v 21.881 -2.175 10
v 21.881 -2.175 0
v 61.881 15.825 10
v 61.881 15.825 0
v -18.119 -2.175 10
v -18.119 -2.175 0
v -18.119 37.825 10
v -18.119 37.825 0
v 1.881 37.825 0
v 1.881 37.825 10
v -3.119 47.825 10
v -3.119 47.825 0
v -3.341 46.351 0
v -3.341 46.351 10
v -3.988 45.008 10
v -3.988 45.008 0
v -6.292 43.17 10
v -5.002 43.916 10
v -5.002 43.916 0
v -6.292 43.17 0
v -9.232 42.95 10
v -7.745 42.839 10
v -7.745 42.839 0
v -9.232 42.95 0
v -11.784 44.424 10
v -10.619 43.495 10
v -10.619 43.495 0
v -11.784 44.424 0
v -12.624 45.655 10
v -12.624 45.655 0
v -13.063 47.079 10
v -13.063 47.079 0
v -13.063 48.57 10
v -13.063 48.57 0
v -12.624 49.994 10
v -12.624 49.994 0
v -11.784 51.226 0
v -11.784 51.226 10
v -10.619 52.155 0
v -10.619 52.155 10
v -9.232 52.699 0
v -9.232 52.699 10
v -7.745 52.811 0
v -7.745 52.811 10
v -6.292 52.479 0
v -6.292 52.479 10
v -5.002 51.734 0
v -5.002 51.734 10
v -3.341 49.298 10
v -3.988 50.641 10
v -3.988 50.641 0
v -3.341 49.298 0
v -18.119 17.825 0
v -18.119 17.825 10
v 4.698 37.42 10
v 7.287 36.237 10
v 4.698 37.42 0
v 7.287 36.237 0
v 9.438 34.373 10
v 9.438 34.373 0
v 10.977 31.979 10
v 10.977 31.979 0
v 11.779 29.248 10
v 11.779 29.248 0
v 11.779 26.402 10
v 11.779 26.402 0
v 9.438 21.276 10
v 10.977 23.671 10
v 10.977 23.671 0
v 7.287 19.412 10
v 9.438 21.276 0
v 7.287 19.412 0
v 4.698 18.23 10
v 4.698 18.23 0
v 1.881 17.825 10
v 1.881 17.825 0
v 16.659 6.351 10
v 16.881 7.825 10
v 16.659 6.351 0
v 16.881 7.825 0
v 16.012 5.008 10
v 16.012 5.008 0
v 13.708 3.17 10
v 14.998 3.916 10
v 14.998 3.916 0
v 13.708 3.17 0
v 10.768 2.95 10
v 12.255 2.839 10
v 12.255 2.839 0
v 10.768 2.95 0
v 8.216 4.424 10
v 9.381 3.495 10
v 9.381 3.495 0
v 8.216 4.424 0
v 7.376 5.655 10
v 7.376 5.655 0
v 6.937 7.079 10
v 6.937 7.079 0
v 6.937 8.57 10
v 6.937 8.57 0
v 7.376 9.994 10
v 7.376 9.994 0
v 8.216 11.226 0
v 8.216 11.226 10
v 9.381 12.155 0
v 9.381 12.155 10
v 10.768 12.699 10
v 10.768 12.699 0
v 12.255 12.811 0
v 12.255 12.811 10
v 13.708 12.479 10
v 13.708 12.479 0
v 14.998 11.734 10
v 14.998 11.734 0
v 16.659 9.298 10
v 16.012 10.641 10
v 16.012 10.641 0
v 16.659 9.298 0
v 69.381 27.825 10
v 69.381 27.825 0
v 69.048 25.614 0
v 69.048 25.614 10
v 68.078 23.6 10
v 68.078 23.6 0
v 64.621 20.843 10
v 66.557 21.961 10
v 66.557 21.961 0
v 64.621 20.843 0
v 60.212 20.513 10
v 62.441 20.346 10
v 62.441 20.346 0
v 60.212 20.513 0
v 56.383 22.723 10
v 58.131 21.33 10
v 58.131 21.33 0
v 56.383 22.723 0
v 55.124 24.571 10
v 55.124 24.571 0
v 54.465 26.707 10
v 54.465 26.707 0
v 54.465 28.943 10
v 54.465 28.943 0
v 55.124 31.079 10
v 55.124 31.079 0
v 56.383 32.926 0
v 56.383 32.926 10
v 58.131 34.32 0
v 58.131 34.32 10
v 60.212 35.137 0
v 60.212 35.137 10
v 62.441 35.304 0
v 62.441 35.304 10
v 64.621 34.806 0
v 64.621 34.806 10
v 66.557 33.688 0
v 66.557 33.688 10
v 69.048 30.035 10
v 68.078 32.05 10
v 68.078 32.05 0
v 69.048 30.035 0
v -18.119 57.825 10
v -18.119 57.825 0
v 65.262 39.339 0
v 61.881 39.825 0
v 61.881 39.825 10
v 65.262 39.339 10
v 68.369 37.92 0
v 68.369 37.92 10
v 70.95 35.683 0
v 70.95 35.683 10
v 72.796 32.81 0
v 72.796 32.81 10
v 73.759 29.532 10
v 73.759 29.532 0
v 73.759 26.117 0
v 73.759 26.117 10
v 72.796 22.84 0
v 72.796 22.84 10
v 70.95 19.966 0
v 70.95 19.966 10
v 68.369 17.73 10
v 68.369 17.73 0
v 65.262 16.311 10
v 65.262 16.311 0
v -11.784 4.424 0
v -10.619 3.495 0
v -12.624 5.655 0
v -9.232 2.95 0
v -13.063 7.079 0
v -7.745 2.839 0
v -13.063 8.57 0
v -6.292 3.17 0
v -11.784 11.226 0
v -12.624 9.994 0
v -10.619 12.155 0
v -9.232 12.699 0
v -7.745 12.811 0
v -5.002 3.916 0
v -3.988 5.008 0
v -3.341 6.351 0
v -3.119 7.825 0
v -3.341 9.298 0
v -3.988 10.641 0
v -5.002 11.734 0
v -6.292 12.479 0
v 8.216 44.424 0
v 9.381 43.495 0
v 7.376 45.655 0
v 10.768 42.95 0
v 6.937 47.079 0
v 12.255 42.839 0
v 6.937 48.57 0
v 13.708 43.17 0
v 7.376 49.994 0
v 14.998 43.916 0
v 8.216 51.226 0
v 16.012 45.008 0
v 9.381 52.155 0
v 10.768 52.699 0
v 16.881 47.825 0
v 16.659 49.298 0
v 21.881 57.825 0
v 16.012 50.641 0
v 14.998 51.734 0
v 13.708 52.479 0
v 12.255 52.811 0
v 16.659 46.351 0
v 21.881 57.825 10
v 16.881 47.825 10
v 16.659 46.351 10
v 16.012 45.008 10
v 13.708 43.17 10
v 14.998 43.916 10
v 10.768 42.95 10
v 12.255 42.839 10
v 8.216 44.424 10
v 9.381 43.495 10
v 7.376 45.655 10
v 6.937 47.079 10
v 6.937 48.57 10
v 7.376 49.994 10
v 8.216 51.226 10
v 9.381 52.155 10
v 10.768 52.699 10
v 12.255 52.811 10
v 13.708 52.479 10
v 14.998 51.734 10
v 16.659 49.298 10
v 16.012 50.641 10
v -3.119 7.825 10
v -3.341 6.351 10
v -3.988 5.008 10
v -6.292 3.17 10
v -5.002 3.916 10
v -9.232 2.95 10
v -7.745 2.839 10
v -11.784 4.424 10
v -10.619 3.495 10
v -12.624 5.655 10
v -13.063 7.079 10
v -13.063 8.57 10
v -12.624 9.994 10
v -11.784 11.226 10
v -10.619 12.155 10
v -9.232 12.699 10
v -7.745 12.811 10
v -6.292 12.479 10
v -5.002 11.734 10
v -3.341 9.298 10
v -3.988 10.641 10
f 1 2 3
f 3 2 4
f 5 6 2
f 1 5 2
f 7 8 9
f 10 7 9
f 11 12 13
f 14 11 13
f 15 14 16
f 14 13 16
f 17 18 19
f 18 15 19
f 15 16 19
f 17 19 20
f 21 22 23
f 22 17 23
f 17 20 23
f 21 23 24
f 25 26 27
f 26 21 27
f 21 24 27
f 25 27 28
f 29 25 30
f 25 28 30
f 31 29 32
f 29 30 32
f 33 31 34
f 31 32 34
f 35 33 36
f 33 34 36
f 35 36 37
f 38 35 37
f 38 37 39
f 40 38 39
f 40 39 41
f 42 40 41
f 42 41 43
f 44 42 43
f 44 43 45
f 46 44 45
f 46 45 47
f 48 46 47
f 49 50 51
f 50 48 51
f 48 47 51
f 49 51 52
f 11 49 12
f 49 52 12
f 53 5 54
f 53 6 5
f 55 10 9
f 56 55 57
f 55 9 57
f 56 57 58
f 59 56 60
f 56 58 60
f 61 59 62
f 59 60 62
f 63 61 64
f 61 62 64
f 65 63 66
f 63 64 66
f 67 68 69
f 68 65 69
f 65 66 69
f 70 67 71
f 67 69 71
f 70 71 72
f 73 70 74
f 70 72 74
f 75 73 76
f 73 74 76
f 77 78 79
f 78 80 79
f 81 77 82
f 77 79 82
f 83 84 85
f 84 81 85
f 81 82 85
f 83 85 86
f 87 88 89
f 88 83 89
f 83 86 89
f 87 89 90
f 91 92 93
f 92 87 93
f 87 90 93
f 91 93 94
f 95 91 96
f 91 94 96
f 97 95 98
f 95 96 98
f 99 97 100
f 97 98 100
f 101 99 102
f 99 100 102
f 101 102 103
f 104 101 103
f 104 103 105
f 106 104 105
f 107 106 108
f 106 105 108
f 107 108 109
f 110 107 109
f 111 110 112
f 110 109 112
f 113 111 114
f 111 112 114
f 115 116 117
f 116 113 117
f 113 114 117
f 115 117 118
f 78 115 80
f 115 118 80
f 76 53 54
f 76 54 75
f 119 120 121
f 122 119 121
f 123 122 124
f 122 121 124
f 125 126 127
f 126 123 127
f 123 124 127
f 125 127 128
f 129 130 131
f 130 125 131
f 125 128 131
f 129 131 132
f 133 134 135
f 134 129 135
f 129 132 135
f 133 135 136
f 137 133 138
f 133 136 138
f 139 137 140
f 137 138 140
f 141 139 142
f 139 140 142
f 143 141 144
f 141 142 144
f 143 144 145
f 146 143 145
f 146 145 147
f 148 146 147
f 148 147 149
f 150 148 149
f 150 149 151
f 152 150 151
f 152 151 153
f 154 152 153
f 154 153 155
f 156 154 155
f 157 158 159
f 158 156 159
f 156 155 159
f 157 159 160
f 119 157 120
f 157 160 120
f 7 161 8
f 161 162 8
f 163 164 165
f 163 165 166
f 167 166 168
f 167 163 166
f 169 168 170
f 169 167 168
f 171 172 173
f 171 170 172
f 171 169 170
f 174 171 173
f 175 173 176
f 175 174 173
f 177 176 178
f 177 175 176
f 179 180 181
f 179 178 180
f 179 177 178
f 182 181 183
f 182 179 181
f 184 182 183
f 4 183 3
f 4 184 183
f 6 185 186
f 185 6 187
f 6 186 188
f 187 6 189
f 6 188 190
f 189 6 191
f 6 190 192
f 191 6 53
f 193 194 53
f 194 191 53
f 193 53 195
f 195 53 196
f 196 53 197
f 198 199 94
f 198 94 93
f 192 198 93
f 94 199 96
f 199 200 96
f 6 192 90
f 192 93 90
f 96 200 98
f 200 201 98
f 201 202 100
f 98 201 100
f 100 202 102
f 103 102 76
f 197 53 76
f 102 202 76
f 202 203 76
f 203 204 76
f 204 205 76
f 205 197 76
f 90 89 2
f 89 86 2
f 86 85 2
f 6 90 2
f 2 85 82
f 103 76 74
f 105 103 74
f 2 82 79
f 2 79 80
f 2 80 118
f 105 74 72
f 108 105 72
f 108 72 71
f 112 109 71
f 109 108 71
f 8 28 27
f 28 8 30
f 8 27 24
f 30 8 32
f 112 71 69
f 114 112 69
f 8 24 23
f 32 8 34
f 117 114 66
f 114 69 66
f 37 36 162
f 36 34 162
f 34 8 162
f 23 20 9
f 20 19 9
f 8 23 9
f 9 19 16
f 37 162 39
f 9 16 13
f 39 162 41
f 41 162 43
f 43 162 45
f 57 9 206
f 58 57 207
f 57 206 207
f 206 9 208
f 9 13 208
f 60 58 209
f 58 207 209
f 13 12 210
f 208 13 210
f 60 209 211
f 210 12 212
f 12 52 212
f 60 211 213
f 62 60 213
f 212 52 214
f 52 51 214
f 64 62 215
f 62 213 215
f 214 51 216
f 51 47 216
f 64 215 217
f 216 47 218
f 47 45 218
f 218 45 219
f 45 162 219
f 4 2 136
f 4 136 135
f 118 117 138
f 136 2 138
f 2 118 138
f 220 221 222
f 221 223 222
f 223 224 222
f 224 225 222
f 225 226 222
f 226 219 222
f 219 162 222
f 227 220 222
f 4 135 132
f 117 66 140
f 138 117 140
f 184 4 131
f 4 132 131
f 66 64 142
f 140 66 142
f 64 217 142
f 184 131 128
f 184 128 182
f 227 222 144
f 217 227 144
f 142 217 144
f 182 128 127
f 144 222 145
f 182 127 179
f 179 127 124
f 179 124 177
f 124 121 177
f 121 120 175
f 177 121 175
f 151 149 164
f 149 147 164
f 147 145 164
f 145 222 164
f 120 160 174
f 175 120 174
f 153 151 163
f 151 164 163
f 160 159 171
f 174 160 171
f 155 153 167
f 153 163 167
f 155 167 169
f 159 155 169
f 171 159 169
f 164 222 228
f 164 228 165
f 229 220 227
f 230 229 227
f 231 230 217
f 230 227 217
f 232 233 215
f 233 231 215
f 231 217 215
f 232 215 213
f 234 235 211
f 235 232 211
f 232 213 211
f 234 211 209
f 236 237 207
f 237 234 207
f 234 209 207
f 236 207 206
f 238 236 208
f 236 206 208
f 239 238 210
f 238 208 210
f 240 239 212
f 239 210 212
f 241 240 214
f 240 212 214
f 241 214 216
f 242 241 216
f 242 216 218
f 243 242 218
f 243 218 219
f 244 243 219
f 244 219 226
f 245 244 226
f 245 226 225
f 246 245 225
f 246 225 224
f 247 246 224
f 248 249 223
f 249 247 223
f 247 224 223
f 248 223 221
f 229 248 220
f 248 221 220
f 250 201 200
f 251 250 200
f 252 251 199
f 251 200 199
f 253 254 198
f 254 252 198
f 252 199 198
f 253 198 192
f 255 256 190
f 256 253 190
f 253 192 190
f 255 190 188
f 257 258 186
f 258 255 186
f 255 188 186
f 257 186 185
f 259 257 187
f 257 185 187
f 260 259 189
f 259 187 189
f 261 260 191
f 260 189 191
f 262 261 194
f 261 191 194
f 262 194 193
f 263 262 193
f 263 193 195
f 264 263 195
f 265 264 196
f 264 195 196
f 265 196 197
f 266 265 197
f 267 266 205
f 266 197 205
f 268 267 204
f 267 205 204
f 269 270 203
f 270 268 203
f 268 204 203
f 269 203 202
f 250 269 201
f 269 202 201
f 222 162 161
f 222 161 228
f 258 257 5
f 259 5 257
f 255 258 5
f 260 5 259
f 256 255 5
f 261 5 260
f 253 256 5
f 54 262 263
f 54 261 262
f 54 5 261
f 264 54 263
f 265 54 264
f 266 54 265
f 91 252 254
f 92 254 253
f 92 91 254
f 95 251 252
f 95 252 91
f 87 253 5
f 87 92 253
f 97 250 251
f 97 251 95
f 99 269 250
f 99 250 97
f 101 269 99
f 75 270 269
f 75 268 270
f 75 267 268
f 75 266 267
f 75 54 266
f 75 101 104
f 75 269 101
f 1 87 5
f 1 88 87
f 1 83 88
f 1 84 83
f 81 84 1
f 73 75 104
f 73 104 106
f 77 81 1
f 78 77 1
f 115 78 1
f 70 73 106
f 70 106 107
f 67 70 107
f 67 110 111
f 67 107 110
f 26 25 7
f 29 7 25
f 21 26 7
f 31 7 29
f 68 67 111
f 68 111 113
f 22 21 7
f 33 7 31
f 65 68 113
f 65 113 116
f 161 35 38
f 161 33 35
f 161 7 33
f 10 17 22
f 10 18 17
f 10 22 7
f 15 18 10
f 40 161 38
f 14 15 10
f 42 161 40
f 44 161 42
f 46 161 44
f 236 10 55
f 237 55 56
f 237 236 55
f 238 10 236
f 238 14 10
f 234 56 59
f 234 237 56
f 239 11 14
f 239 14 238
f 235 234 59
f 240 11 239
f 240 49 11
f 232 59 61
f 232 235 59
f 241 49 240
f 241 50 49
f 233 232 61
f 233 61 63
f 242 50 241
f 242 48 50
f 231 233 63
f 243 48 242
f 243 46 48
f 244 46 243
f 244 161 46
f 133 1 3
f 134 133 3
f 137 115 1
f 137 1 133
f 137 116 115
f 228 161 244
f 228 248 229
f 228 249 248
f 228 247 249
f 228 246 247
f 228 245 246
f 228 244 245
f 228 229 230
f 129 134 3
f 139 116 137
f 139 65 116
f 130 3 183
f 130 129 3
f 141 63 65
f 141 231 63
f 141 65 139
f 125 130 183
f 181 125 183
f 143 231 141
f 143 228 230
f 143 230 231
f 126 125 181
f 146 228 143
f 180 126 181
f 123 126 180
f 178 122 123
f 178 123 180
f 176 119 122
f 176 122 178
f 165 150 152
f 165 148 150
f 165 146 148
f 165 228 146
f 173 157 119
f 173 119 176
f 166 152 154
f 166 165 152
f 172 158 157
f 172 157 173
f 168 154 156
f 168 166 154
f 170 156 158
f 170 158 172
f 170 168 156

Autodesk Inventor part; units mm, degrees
ref_plane "YZ Plane" through (0, 0, 0) normal (1, 0, 0) x (0, 1, 0)
ref_plane "XZ Plane" through (0, 0, 0) normal (0, 1, 0) x (-1, 0, 0)
ref_plane "XY Plane" through (0, 0, 0) normal (0, 0, 1) x (1, 0, 0)
sketch "Эскиз1" plane through (0, 0, 0) normal (0, 0, 1) x (1, 0, 0)
  line L0 (-18.1191, -2.1753) -> (21.8809, -2.1753)
  line L1 (-18.1191, -2.1753) -> (-18.1191, 17.8247)
  line L2 (-18.1191, 17.8247) -> (1.8809, 17.8247)
  line L3 (-18.1191, 57.8247) -> (-18.1191, 37.8247)
  line L4 (-18.1191, 37.8247) -> (1.8809, 37.8247)
  line L5 (-18.1191, 57.8247) -> (21.8809, 57.8247)
  arc A0 (1.8809, 17.8247) -> (1.8809, 37.8247) centre (1.8809, 27.8247) ccw
  circle A1 centre (61.8809, 27.8247) radius 7.5
  line L6 (21.8809, 57.8247) -> (61.8809, 39.8247)
  line L7 (21.8809, -2.1753) -> (61.8809, 15.8247)
  arc A2 (61.8809, 15.8247) -> (61.8809, 39.8247) centre (61.8809, 27.8247) ccw
  circle A3 centre (-8.1191, 47.8247) radius 5
  circle A4 centre (-8.1191, 7.8247) radius 5
  circle A5 centre (11.8809, 47.8247) radius 5
  circle A6 centre (11.8809, 7.8247) radius 5
  point P0 (0, 0)
  dimension "j" = 40
  dimension "p" = 20
  dimension "g1" = 20
  dimension "d" = 60
  dimension "p1" = 20
  dimension "R1" = 15
  dimension "t" = 12
  dimension "r" = 10
  dimension "u" = 20
  dimension "a" = 80
  dimension "f1" = 10
sketch "Эскиз2" plane through (0, 0, 0) normal (0, 0, 1) x (1, 0, 0)
  point P0 (0, 0)
sketch "Эскиз3" plane through (0, 0, 0) normal (0, 0, 1) x (1, 0, 0)
  point P0 (0, 0)
extrude "Выдавливание1" add sketch "Эскиз1" along normal blind 10
properties part number "Model"
